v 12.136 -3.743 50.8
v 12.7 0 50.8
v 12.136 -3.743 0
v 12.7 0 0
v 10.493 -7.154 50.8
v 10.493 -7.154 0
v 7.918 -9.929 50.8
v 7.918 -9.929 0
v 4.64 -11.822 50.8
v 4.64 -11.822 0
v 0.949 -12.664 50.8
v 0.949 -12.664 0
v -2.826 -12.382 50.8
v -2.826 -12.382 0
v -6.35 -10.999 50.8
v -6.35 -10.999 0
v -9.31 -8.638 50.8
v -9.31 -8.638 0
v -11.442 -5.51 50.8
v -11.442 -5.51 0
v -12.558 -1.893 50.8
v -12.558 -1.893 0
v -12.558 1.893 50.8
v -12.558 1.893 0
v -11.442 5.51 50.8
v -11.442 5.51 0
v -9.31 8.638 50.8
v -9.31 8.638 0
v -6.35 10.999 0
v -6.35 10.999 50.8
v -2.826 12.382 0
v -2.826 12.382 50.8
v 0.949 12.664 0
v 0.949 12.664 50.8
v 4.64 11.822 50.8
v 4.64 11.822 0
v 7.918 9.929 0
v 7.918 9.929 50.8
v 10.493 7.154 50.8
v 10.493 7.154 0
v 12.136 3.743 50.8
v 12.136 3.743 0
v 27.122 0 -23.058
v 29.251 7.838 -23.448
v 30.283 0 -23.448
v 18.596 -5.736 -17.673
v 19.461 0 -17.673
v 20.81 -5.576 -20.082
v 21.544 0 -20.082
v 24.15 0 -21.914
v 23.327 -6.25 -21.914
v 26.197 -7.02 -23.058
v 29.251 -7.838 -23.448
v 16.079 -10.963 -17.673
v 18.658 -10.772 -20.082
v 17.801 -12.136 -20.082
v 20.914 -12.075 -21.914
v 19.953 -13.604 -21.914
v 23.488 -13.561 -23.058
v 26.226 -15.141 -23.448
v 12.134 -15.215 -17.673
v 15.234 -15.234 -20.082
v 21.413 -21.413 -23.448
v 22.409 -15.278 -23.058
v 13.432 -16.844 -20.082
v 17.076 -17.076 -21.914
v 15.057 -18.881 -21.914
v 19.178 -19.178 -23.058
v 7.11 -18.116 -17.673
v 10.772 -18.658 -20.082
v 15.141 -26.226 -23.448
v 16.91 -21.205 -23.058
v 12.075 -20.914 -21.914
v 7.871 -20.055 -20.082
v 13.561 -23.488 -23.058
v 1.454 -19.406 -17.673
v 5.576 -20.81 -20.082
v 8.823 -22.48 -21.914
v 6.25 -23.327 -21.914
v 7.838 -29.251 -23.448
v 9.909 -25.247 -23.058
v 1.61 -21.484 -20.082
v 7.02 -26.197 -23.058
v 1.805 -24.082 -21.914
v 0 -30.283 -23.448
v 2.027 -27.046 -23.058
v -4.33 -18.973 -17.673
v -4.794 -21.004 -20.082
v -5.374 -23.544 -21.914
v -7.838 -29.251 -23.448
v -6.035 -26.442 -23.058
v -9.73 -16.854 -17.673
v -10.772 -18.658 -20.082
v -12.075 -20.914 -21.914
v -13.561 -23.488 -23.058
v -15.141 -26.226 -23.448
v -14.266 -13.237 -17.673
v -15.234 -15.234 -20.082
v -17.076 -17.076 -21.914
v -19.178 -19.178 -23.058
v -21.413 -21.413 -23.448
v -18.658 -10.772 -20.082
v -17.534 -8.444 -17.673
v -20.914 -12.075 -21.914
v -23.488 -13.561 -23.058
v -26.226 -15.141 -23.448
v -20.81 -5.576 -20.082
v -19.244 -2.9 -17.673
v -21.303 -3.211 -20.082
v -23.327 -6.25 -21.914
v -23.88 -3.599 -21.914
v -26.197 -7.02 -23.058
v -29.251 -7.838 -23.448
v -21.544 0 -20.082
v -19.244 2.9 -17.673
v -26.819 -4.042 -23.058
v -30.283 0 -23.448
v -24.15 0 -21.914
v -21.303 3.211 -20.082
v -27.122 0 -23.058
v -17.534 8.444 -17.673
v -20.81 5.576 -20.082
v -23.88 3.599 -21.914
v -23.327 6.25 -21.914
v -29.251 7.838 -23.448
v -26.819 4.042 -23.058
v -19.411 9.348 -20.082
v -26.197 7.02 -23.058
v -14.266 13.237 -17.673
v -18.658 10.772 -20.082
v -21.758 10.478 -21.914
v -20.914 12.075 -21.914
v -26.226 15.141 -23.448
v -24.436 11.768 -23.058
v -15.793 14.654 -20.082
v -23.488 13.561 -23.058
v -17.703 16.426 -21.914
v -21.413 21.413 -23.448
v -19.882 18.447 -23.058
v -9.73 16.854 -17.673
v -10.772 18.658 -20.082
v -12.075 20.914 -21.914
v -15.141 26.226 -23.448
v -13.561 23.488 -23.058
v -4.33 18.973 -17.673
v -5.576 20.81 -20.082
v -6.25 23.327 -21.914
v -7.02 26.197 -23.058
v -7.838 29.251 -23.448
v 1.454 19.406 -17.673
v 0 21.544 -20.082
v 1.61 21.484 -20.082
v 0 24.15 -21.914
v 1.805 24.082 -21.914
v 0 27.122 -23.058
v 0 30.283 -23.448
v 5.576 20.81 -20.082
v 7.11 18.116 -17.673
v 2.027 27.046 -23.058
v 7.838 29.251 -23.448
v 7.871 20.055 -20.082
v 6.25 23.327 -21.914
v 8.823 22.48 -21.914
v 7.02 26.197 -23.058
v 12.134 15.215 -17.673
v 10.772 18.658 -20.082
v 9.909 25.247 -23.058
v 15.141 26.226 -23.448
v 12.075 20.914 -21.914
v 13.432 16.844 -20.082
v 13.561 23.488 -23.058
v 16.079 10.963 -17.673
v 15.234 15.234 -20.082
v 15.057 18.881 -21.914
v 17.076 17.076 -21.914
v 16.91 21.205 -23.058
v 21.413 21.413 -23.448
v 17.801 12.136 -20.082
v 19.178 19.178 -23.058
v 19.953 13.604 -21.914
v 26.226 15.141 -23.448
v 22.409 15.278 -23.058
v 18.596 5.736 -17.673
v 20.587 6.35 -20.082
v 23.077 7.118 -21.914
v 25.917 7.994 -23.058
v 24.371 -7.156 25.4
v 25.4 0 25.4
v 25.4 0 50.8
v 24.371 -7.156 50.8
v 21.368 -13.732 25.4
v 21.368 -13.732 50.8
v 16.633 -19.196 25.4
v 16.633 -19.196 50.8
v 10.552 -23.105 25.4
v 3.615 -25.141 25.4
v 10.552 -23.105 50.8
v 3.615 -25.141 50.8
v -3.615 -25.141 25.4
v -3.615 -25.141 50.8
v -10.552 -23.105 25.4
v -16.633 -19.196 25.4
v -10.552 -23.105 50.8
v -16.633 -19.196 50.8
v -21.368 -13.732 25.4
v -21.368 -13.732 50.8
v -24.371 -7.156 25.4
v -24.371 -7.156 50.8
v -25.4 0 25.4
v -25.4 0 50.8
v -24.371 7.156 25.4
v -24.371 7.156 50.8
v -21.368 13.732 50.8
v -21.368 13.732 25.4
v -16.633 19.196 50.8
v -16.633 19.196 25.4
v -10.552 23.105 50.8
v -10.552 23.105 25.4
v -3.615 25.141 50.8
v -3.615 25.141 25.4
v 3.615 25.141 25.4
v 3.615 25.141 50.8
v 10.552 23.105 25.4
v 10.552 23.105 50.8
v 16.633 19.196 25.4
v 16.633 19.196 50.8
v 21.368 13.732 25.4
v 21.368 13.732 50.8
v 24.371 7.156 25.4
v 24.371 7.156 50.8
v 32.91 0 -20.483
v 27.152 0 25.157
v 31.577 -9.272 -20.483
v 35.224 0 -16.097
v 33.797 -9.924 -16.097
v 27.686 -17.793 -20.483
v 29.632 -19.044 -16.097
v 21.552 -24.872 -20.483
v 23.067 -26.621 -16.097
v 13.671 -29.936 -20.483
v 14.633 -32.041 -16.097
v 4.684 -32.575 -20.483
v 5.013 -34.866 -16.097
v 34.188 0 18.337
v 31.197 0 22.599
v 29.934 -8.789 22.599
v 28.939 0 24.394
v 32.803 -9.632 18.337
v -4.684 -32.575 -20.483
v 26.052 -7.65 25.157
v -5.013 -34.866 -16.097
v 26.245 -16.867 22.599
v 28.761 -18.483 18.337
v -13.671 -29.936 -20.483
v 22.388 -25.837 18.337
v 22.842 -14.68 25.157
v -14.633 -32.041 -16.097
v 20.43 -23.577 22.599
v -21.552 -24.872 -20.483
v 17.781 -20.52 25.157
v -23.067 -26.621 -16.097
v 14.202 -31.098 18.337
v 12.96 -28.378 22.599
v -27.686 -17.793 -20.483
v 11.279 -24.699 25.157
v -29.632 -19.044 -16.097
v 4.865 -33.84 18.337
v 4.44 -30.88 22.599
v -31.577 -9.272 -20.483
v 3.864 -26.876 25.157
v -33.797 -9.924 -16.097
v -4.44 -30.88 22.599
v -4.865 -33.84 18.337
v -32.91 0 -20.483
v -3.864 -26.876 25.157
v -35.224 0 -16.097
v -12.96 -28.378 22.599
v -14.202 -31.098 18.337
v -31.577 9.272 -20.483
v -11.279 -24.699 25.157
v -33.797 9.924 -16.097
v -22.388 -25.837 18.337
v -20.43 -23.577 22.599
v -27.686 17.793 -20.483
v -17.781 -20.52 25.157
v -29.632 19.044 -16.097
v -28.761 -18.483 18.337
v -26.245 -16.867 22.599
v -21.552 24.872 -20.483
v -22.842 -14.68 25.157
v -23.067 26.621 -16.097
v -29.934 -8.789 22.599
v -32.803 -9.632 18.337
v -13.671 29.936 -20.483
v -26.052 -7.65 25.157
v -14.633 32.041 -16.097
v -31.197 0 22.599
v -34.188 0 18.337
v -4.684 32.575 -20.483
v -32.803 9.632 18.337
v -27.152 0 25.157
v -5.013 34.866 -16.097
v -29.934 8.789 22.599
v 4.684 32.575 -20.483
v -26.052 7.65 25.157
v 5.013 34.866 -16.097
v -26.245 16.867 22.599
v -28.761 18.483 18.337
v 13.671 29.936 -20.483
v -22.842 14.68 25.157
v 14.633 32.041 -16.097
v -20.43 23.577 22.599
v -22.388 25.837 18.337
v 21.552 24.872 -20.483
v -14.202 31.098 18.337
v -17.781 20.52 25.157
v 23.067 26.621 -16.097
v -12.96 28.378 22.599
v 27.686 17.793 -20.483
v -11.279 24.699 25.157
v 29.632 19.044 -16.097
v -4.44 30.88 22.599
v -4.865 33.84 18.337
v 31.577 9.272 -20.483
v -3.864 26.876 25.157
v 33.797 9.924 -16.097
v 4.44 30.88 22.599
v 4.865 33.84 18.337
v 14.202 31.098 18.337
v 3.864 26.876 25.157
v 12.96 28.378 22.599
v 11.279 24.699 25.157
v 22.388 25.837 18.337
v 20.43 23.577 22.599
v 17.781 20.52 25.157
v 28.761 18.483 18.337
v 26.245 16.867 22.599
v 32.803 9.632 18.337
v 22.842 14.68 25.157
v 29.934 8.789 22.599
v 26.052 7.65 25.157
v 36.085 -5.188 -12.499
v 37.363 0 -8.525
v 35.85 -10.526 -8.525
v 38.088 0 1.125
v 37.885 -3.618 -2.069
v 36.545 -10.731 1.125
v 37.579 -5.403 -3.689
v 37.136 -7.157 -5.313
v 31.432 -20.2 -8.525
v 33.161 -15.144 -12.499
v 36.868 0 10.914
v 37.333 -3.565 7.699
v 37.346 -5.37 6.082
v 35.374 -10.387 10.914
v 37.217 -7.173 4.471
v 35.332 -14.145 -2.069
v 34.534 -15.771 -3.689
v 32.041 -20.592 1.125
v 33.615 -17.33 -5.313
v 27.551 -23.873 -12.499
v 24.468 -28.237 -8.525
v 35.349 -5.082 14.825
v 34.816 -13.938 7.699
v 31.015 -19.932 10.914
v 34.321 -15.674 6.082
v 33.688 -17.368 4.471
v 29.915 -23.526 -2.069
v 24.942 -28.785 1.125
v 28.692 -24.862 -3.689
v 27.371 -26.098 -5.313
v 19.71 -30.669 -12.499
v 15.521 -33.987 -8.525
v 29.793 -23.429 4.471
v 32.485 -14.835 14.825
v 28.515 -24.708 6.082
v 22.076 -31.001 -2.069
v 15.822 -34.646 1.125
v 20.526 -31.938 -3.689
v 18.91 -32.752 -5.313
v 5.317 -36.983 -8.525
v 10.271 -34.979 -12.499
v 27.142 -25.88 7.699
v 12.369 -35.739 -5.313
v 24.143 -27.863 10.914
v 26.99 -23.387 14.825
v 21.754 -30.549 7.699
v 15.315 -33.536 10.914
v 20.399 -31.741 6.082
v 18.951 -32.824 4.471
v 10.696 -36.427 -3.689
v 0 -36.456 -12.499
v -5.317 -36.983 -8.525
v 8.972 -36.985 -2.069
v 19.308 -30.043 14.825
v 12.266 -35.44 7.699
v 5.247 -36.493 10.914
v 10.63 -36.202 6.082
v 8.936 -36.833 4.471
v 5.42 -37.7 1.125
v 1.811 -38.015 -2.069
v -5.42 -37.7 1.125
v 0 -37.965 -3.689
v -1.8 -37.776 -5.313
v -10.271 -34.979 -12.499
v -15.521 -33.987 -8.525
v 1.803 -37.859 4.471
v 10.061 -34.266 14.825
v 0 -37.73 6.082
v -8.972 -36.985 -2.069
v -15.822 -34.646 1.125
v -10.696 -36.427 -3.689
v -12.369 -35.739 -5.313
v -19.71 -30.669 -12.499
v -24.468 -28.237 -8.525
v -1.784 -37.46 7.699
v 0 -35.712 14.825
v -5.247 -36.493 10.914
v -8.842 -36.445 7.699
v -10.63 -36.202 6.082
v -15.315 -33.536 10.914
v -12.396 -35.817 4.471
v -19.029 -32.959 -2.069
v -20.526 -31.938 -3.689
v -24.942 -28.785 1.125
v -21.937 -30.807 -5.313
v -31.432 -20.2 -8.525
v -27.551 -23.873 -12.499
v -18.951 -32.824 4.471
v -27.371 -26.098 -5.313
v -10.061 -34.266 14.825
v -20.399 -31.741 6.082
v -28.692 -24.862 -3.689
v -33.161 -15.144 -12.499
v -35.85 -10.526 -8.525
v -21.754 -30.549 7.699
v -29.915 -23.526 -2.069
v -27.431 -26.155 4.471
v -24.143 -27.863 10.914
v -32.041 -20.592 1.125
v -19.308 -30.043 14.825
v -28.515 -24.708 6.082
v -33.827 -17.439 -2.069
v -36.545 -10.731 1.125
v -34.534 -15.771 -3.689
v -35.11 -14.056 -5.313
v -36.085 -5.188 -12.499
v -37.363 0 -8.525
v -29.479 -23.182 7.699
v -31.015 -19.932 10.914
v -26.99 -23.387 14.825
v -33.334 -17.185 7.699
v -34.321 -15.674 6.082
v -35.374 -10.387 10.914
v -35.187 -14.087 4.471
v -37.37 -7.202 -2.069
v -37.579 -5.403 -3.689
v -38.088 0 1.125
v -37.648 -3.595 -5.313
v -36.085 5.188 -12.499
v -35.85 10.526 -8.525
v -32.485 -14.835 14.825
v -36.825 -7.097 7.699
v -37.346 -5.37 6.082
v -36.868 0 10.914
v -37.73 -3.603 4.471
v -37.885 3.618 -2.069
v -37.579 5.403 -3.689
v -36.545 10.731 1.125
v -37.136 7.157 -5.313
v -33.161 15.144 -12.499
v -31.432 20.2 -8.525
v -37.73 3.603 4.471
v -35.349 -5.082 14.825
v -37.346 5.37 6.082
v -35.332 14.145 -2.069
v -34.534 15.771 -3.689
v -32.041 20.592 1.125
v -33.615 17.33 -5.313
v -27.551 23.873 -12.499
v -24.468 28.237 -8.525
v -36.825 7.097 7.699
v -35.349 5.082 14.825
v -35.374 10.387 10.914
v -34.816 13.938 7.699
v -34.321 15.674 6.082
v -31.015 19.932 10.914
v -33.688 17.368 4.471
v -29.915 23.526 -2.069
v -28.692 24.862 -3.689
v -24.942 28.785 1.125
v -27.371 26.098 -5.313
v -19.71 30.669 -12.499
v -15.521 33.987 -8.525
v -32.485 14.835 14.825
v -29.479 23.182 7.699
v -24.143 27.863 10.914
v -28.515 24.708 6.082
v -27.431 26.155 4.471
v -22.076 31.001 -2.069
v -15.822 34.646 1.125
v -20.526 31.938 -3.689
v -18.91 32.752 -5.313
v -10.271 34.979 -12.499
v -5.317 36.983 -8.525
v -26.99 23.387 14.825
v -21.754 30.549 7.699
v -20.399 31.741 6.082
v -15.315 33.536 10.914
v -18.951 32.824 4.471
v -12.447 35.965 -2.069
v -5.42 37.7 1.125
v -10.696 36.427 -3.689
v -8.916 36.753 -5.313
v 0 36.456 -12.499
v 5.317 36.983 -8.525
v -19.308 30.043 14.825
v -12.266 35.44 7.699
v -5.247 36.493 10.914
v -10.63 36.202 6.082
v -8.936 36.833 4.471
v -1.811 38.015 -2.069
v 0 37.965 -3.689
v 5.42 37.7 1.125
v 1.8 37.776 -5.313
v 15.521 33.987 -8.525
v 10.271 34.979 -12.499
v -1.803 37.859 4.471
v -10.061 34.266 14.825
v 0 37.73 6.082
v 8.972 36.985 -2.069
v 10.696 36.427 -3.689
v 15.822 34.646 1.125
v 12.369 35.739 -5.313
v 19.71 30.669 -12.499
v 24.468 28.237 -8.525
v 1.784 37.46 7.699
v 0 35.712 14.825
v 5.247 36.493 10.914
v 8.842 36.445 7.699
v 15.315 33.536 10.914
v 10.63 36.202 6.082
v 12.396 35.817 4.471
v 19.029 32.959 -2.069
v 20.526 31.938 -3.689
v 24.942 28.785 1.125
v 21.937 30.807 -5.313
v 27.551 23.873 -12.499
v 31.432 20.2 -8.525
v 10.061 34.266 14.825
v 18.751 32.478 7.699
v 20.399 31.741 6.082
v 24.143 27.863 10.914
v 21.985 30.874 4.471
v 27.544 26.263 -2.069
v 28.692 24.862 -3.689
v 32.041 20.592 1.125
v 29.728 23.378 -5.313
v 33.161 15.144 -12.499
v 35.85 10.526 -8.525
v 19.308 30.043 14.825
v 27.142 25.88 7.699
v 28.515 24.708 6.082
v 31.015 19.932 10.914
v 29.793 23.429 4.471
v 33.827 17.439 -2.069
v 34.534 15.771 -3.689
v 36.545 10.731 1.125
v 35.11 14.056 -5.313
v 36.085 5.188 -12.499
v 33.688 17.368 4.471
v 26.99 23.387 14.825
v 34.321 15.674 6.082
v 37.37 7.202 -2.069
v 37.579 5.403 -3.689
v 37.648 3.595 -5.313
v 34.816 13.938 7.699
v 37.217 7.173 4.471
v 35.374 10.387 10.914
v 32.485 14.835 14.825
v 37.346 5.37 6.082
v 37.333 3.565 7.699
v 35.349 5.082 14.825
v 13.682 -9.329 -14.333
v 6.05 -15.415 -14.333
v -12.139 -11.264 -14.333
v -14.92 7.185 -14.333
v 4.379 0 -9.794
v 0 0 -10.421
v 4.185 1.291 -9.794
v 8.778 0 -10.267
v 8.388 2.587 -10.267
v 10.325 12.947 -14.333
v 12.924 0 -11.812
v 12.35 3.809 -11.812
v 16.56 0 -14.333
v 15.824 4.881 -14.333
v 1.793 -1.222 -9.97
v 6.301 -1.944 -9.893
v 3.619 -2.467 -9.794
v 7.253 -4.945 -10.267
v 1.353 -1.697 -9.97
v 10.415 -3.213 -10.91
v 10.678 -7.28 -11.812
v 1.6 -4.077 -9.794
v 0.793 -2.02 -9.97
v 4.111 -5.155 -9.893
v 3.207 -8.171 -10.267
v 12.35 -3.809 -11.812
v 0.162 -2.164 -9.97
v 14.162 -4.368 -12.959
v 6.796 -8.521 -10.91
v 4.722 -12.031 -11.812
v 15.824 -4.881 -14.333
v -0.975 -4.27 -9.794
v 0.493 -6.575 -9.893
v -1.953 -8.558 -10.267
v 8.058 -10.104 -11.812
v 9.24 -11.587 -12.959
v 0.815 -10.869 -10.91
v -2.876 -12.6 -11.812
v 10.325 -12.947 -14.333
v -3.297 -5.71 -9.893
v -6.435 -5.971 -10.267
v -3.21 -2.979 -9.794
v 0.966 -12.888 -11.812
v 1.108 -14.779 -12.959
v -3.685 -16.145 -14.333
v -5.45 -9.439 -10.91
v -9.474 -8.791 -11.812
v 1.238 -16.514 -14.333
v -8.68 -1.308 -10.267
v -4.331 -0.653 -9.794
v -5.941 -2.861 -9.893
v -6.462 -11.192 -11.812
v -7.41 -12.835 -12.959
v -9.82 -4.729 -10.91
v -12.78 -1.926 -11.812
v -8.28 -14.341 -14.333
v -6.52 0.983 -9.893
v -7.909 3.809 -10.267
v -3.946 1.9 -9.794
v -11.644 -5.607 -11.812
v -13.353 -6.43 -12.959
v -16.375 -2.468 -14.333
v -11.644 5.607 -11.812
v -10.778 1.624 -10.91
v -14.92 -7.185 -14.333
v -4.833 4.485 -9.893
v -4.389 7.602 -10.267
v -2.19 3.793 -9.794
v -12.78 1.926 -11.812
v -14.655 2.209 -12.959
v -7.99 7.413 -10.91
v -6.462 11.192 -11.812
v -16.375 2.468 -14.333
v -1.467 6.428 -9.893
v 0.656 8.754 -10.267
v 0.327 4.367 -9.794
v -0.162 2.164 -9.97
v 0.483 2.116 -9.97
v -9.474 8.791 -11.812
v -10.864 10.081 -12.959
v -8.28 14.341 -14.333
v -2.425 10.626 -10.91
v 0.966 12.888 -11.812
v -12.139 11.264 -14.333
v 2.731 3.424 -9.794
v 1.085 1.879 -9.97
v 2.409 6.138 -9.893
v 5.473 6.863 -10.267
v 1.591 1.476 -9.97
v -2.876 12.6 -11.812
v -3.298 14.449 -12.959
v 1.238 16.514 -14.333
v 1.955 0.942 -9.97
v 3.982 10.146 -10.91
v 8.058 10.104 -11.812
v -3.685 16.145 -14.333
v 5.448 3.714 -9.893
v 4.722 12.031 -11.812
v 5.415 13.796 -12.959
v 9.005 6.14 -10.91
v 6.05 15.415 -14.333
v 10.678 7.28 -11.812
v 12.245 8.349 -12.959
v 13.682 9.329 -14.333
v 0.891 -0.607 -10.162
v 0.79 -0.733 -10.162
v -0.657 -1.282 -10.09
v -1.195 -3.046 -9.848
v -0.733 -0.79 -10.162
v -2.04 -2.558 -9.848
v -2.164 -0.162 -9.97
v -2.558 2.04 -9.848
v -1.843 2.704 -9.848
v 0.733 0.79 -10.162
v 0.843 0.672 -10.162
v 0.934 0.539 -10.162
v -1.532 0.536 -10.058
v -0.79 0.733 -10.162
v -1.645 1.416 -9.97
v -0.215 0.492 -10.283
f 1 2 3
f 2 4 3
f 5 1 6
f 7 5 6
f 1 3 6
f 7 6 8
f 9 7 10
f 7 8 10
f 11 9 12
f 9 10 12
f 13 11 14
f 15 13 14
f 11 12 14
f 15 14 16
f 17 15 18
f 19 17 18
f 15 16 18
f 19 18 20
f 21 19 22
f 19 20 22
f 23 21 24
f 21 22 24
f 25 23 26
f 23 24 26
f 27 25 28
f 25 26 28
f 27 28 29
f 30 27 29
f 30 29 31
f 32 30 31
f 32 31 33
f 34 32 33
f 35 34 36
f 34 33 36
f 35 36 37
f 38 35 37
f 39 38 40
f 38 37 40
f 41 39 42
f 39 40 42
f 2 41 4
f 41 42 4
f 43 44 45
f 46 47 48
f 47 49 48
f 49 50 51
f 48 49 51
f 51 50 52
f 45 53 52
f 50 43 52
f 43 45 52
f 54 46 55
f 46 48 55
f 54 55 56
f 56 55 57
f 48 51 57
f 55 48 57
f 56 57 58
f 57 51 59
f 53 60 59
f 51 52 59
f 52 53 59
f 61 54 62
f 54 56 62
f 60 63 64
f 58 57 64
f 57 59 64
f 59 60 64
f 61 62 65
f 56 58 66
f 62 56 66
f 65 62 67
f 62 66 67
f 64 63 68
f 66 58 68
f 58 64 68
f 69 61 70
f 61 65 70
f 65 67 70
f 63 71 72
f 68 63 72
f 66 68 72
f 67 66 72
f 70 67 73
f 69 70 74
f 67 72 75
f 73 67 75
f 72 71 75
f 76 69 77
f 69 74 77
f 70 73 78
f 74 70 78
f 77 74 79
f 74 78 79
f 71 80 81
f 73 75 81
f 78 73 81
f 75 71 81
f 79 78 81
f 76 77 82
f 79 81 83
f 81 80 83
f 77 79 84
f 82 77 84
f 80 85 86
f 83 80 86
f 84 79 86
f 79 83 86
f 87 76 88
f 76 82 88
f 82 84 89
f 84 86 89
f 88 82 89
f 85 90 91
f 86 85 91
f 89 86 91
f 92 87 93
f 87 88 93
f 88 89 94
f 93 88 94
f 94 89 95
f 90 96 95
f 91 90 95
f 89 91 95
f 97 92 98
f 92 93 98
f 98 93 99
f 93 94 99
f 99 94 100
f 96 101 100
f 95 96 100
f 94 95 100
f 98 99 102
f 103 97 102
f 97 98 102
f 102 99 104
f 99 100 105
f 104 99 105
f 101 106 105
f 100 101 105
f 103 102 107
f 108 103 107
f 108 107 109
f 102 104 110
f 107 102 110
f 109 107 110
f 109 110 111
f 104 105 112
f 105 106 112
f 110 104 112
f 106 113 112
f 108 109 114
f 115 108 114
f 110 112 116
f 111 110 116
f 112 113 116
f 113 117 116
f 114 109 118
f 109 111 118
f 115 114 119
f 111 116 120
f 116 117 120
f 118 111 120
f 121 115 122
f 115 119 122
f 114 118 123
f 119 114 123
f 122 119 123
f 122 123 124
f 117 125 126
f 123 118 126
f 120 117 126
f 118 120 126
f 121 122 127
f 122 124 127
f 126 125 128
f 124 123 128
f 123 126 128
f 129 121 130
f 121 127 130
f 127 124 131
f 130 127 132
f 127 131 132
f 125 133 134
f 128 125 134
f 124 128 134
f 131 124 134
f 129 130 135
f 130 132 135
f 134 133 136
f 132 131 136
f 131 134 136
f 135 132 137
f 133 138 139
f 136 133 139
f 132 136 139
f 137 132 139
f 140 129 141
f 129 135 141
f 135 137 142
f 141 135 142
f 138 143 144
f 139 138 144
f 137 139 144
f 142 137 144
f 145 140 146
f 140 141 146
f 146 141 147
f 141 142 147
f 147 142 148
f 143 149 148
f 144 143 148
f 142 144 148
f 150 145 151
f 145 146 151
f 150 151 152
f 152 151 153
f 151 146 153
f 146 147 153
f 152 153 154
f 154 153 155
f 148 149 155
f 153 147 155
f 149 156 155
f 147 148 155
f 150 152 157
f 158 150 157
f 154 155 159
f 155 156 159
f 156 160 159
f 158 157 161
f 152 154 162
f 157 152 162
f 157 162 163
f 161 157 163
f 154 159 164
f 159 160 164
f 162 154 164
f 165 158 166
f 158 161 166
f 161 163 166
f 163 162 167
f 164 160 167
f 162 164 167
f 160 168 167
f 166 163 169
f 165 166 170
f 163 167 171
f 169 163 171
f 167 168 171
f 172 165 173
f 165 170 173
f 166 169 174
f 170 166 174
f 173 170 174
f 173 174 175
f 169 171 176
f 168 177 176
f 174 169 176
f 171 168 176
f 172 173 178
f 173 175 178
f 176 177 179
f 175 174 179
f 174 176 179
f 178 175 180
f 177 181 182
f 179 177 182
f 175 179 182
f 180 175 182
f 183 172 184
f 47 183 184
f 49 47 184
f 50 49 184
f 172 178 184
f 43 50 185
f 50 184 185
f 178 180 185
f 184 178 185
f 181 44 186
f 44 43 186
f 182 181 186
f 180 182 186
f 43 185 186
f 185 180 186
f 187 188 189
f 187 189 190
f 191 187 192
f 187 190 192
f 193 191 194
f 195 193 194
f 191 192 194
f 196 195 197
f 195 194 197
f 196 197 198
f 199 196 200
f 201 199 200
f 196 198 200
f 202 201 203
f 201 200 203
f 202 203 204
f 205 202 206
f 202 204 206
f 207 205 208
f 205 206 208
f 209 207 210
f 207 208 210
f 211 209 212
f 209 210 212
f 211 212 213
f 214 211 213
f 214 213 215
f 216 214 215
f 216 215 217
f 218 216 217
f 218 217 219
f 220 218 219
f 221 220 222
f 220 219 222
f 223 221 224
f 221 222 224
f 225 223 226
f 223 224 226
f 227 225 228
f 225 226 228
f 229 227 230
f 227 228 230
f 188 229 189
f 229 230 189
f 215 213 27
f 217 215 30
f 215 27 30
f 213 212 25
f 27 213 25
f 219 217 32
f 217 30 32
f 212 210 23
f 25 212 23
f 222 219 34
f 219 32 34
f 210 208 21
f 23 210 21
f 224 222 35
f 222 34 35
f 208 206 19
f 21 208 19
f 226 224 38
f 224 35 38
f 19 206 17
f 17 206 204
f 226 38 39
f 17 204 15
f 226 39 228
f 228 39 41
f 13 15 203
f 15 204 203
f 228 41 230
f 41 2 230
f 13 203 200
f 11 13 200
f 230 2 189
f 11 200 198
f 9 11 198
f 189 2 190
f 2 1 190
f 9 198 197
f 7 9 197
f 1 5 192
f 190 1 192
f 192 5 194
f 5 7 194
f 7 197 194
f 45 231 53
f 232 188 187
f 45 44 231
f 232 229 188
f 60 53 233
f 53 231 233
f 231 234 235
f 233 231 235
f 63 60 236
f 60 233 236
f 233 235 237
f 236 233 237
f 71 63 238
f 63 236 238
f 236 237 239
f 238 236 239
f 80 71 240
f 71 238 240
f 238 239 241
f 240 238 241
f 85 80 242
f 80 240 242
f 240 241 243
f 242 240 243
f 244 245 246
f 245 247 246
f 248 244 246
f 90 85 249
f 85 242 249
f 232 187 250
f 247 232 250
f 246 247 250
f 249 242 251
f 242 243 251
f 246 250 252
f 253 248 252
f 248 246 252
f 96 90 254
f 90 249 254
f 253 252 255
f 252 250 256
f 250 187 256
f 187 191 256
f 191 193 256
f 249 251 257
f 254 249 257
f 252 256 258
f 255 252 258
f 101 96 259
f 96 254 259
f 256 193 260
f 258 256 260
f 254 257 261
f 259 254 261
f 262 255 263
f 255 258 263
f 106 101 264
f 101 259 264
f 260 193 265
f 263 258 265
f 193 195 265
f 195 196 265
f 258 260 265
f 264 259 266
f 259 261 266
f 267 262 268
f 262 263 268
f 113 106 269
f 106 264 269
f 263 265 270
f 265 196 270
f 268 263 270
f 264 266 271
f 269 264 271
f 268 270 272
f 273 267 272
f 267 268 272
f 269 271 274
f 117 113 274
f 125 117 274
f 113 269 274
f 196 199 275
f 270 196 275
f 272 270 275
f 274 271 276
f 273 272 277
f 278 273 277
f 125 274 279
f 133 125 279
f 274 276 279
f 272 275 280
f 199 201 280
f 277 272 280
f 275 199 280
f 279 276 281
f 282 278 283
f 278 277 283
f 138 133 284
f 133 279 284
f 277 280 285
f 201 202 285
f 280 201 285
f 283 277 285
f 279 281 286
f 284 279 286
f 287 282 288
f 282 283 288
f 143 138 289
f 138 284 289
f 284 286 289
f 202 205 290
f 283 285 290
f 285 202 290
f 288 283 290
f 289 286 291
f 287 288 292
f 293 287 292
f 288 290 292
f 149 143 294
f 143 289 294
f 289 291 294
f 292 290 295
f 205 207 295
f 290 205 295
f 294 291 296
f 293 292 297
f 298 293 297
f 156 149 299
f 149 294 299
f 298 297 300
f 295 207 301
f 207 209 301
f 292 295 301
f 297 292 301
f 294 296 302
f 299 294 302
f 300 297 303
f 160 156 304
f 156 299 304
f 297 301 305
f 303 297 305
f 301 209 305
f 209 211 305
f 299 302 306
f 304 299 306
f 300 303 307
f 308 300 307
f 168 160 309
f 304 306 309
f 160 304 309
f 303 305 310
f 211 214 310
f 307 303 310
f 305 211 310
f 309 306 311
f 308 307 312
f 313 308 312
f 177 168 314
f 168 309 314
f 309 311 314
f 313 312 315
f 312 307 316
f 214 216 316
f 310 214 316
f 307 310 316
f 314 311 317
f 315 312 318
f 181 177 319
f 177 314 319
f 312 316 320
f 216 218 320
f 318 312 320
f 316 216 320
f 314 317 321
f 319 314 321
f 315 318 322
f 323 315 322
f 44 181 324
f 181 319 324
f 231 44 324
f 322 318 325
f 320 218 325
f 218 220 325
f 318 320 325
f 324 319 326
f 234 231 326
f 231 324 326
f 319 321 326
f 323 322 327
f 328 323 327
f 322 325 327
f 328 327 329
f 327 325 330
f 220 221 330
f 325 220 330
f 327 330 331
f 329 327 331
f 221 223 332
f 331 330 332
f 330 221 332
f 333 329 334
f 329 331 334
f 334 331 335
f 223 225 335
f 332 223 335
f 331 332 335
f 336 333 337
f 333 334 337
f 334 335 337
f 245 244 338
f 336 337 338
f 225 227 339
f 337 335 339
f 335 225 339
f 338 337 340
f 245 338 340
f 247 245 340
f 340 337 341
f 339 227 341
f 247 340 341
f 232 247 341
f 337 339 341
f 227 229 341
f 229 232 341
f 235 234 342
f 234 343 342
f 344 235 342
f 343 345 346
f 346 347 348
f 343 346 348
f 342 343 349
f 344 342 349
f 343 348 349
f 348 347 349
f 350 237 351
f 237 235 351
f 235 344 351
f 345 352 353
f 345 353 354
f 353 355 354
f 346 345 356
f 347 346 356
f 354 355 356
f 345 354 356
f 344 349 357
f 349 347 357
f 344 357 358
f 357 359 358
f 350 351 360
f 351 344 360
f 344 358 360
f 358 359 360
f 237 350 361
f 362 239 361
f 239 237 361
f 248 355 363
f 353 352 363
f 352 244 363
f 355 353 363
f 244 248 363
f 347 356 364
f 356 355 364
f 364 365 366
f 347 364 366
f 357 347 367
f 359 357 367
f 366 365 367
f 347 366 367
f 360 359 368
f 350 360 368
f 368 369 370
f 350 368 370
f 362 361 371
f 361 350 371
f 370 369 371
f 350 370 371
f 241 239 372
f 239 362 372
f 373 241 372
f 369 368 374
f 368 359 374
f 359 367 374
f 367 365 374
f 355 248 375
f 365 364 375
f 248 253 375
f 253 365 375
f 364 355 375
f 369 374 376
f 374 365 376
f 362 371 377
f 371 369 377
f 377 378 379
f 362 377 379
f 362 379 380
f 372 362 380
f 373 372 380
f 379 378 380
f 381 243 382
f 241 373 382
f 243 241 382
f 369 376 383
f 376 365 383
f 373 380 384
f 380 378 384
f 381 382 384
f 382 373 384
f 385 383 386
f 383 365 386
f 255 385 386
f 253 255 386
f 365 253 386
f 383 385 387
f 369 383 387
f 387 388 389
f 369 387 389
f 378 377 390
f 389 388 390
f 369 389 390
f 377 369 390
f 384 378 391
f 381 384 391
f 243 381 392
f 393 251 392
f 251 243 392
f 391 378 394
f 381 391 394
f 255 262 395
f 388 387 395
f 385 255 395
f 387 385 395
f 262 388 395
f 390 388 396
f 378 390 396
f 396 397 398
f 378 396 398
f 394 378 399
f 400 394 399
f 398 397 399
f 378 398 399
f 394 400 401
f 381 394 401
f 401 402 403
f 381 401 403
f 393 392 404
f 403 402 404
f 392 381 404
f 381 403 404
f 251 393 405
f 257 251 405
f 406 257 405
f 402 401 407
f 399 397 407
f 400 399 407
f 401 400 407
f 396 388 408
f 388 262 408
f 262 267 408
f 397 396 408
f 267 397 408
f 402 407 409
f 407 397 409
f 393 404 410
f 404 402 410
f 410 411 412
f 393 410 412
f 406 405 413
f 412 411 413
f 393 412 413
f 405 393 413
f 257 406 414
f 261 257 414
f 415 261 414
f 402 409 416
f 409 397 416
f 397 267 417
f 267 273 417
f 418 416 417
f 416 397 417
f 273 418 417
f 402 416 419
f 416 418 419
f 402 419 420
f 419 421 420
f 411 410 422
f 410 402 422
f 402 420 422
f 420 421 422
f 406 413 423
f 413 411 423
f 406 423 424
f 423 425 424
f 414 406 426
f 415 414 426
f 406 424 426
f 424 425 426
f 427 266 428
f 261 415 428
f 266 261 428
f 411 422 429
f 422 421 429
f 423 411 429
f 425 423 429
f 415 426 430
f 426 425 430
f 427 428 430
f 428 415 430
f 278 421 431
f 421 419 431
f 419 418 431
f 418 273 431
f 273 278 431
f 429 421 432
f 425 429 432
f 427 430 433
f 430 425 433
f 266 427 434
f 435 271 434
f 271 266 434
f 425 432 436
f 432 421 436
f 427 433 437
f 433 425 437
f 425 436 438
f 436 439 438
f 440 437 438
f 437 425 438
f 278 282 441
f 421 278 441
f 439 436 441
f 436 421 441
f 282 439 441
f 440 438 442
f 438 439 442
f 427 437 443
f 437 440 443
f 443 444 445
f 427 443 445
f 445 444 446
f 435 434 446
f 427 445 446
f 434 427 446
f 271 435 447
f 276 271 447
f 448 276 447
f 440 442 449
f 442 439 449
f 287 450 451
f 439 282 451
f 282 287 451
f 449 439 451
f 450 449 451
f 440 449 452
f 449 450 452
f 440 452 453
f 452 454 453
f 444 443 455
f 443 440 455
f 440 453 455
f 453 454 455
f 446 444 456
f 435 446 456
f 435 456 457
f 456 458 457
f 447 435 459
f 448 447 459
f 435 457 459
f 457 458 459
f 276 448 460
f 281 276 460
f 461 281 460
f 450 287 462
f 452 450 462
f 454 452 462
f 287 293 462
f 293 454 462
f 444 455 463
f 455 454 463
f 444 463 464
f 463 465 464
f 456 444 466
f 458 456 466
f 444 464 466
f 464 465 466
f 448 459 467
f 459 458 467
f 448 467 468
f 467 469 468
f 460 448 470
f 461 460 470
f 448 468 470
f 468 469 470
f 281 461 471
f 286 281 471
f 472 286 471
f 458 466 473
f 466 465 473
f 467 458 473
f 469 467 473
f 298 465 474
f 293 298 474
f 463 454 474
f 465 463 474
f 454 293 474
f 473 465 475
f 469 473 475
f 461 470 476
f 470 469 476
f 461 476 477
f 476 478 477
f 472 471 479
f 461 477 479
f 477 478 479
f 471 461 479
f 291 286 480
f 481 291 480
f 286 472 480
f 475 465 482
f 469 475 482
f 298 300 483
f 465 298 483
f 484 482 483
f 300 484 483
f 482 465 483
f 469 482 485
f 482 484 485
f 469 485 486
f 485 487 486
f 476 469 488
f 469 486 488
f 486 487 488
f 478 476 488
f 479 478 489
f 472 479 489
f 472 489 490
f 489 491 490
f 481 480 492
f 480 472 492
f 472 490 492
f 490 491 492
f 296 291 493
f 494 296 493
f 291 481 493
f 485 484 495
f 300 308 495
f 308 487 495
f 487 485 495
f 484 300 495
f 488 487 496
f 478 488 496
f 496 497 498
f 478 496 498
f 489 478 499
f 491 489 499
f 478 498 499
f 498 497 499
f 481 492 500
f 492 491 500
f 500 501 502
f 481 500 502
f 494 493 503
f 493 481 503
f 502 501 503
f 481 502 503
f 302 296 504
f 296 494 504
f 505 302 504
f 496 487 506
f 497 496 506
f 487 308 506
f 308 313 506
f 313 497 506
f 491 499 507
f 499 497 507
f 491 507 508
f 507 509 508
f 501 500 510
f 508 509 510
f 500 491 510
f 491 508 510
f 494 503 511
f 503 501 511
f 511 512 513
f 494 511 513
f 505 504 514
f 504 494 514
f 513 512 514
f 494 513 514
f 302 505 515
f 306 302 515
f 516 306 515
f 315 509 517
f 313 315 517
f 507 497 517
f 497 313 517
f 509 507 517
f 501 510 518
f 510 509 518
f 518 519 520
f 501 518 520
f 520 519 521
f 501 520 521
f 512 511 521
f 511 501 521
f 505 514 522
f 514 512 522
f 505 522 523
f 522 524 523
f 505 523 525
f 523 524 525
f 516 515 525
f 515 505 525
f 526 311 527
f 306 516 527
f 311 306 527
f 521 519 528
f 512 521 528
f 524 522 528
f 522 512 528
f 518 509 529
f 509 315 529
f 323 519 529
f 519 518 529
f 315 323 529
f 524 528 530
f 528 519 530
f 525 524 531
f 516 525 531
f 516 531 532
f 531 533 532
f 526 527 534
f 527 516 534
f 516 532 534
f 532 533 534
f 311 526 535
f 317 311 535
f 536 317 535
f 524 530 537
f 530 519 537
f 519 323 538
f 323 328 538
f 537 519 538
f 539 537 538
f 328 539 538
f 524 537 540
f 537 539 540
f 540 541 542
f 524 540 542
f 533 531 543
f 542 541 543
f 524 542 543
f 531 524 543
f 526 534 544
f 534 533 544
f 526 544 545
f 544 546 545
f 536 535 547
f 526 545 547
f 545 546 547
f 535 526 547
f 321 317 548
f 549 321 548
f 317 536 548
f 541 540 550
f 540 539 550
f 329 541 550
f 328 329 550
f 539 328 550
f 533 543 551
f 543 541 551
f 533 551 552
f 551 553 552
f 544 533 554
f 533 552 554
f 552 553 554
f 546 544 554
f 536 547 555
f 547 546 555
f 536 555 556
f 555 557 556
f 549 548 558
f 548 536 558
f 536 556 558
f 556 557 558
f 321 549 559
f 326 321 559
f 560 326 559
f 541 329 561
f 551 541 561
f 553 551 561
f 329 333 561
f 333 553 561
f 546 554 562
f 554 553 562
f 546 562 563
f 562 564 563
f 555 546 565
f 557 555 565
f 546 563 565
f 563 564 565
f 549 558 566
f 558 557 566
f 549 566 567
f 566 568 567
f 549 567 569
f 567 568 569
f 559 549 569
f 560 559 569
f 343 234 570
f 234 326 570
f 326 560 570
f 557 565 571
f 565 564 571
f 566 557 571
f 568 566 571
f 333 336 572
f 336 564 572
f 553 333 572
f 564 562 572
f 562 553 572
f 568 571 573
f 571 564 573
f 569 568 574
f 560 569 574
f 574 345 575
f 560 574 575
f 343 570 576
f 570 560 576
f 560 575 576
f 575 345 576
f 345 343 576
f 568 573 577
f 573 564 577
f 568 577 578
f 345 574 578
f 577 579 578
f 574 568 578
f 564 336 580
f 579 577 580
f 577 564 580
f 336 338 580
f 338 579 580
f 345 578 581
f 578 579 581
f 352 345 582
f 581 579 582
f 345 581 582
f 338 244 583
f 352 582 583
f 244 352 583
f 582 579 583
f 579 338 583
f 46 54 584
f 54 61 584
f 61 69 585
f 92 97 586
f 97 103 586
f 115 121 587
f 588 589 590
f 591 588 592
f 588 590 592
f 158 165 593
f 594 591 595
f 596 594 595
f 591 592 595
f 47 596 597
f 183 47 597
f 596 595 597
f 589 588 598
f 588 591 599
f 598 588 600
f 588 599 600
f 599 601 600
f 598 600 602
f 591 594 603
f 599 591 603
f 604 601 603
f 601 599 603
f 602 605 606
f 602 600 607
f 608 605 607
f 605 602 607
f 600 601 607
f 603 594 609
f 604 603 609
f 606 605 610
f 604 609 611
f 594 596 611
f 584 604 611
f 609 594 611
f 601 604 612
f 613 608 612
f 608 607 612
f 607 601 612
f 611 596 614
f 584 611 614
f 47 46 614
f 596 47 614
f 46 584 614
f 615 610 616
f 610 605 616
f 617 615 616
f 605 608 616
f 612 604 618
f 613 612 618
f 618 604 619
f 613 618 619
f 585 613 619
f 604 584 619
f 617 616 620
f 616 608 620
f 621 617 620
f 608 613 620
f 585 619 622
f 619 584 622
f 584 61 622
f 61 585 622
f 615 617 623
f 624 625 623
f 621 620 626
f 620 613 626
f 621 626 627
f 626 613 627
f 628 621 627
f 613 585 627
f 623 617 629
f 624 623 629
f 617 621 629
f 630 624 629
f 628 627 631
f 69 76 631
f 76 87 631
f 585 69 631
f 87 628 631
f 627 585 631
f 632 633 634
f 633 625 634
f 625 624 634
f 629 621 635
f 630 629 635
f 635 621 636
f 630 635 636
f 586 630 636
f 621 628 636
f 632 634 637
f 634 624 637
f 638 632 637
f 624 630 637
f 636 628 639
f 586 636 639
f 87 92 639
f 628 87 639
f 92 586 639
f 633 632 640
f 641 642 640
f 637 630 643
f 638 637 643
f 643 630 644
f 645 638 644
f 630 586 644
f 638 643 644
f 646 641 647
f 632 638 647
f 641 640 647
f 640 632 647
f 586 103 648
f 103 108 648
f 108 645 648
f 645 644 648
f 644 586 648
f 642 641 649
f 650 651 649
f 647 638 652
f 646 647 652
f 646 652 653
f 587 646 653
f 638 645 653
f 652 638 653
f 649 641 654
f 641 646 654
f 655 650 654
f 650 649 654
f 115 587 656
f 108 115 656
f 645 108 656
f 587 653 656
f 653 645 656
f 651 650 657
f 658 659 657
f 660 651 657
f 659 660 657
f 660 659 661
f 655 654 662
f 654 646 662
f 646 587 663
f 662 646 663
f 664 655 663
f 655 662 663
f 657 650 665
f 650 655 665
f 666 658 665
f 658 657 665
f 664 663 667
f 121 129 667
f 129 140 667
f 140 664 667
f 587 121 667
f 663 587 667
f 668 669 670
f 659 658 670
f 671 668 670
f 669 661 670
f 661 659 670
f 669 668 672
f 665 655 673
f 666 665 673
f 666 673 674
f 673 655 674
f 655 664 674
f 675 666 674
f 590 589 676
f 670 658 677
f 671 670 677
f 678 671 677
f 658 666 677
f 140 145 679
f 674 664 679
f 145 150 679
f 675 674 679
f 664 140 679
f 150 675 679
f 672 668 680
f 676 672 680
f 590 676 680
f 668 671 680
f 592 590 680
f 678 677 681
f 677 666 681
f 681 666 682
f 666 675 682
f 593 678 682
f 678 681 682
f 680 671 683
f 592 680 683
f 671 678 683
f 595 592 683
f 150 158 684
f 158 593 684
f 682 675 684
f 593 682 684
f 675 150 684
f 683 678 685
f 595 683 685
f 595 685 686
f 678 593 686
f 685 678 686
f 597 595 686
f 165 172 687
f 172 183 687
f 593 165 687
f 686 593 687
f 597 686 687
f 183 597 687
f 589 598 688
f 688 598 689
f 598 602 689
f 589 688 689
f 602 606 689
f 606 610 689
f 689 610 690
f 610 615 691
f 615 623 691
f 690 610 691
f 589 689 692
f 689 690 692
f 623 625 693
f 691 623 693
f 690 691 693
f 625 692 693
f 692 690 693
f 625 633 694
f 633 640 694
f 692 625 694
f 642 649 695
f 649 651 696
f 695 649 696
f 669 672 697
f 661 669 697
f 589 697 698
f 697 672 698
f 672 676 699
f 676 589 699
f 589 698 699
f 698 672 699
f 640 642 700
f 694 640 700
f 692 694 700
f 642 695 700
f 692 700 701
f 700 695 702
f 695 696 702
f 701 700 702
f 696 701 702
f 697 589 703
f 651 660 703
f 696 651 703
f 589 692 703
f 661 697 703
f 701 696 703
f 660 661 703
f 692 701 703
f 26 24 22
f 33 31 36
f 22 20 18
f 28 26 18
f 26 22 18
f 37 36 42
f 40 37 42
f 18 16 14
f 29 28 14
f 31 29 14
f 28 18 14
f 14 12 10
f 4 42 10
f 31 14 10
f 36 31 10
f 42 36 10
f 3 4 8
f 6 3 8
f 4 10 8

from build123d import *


with BuildPart() as f1:
    # F0 (on Front) → F1 (revolve)
    with BuildSketch(Plane.XZ):
        with BuildLine():
            Line((12.7, 0), (0, 0))
            Line((0, 0), (0, -10.420766383))
            ThreePointArc((0, -10.420766383), (10.8993419204, -10.9100704278), (19.4608935292, -17.6728292433))
            ThreePointArc((19.4608935292, -17.6728292433), (24.1495407715, -21.9137175646), (30.282663525, -23.4477814506))
            add(Edge.make_bspline(
                [(30.282663525, -23.4477814506), (39.8947702797, -15.4414480758), (37.8535818762, 4.97927674), (35.8123934726, 25.4000015557), (25.4, 25.4000015557)],
                knots=[3.5362172818, 3.5362172818, 3.5362172818, 4.9097012945, 4.9097012945, 6.2831853072, 6.2831853072, 6.2831853072], degree=2, weights=[1, 0.7733157522, 1, 0.7733157522, 1]))
            Line((25.4, 25.4000015557), (25.4, 50.8))
            Line((25.4, 50.8), (12.7, 50.8))
            Line((12.7, 50.8), (12.7, 0))
        make_face()
    revolve(axis=Axis((0, 0, -5.2103831915), (0, 0, -1)))


solid = f1.part
